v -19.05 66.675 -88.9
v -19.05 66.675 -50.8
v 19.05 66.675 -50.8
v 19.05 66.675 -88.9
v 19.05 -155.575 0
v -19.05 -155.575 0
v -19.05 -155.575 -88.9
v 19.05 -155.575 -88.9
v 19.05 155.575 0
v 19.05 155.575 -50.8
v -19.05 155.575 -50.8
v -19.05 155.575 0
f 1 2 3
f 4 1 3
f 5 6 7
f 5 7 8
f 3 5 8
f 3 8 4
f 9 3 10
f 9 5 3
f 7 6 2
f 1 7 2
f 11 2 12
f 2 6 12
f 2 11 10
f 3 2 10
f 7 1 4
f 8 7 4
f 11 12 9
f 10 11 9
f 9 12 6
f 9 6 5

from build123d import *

# Parameters (mm, degrees)
F0_W     = 38.1
F0_H     = 222.25
F1_DEPTH = 88.9
F0_H_2   = 88.9
F2_DEPTH = 50.8


with BuildPart() as f1:
    # F0 (on Top) → F1 (new body)
    with BuildSketch(Plane.XY):
        with Locations((0, -44.45)):
            Rectangle(F0_W, F0_H)
    extrude(amount=-F1_DEPTH)

    # F0 (on Top) → F2 (join)
    with BuildSketch(Plane.XY):
        with Locations((0, 111.125)):
            Rectangle(F0_W, F0_H_2)
    extrude(amount=-F2_DEPTH)


solid = f1.part
